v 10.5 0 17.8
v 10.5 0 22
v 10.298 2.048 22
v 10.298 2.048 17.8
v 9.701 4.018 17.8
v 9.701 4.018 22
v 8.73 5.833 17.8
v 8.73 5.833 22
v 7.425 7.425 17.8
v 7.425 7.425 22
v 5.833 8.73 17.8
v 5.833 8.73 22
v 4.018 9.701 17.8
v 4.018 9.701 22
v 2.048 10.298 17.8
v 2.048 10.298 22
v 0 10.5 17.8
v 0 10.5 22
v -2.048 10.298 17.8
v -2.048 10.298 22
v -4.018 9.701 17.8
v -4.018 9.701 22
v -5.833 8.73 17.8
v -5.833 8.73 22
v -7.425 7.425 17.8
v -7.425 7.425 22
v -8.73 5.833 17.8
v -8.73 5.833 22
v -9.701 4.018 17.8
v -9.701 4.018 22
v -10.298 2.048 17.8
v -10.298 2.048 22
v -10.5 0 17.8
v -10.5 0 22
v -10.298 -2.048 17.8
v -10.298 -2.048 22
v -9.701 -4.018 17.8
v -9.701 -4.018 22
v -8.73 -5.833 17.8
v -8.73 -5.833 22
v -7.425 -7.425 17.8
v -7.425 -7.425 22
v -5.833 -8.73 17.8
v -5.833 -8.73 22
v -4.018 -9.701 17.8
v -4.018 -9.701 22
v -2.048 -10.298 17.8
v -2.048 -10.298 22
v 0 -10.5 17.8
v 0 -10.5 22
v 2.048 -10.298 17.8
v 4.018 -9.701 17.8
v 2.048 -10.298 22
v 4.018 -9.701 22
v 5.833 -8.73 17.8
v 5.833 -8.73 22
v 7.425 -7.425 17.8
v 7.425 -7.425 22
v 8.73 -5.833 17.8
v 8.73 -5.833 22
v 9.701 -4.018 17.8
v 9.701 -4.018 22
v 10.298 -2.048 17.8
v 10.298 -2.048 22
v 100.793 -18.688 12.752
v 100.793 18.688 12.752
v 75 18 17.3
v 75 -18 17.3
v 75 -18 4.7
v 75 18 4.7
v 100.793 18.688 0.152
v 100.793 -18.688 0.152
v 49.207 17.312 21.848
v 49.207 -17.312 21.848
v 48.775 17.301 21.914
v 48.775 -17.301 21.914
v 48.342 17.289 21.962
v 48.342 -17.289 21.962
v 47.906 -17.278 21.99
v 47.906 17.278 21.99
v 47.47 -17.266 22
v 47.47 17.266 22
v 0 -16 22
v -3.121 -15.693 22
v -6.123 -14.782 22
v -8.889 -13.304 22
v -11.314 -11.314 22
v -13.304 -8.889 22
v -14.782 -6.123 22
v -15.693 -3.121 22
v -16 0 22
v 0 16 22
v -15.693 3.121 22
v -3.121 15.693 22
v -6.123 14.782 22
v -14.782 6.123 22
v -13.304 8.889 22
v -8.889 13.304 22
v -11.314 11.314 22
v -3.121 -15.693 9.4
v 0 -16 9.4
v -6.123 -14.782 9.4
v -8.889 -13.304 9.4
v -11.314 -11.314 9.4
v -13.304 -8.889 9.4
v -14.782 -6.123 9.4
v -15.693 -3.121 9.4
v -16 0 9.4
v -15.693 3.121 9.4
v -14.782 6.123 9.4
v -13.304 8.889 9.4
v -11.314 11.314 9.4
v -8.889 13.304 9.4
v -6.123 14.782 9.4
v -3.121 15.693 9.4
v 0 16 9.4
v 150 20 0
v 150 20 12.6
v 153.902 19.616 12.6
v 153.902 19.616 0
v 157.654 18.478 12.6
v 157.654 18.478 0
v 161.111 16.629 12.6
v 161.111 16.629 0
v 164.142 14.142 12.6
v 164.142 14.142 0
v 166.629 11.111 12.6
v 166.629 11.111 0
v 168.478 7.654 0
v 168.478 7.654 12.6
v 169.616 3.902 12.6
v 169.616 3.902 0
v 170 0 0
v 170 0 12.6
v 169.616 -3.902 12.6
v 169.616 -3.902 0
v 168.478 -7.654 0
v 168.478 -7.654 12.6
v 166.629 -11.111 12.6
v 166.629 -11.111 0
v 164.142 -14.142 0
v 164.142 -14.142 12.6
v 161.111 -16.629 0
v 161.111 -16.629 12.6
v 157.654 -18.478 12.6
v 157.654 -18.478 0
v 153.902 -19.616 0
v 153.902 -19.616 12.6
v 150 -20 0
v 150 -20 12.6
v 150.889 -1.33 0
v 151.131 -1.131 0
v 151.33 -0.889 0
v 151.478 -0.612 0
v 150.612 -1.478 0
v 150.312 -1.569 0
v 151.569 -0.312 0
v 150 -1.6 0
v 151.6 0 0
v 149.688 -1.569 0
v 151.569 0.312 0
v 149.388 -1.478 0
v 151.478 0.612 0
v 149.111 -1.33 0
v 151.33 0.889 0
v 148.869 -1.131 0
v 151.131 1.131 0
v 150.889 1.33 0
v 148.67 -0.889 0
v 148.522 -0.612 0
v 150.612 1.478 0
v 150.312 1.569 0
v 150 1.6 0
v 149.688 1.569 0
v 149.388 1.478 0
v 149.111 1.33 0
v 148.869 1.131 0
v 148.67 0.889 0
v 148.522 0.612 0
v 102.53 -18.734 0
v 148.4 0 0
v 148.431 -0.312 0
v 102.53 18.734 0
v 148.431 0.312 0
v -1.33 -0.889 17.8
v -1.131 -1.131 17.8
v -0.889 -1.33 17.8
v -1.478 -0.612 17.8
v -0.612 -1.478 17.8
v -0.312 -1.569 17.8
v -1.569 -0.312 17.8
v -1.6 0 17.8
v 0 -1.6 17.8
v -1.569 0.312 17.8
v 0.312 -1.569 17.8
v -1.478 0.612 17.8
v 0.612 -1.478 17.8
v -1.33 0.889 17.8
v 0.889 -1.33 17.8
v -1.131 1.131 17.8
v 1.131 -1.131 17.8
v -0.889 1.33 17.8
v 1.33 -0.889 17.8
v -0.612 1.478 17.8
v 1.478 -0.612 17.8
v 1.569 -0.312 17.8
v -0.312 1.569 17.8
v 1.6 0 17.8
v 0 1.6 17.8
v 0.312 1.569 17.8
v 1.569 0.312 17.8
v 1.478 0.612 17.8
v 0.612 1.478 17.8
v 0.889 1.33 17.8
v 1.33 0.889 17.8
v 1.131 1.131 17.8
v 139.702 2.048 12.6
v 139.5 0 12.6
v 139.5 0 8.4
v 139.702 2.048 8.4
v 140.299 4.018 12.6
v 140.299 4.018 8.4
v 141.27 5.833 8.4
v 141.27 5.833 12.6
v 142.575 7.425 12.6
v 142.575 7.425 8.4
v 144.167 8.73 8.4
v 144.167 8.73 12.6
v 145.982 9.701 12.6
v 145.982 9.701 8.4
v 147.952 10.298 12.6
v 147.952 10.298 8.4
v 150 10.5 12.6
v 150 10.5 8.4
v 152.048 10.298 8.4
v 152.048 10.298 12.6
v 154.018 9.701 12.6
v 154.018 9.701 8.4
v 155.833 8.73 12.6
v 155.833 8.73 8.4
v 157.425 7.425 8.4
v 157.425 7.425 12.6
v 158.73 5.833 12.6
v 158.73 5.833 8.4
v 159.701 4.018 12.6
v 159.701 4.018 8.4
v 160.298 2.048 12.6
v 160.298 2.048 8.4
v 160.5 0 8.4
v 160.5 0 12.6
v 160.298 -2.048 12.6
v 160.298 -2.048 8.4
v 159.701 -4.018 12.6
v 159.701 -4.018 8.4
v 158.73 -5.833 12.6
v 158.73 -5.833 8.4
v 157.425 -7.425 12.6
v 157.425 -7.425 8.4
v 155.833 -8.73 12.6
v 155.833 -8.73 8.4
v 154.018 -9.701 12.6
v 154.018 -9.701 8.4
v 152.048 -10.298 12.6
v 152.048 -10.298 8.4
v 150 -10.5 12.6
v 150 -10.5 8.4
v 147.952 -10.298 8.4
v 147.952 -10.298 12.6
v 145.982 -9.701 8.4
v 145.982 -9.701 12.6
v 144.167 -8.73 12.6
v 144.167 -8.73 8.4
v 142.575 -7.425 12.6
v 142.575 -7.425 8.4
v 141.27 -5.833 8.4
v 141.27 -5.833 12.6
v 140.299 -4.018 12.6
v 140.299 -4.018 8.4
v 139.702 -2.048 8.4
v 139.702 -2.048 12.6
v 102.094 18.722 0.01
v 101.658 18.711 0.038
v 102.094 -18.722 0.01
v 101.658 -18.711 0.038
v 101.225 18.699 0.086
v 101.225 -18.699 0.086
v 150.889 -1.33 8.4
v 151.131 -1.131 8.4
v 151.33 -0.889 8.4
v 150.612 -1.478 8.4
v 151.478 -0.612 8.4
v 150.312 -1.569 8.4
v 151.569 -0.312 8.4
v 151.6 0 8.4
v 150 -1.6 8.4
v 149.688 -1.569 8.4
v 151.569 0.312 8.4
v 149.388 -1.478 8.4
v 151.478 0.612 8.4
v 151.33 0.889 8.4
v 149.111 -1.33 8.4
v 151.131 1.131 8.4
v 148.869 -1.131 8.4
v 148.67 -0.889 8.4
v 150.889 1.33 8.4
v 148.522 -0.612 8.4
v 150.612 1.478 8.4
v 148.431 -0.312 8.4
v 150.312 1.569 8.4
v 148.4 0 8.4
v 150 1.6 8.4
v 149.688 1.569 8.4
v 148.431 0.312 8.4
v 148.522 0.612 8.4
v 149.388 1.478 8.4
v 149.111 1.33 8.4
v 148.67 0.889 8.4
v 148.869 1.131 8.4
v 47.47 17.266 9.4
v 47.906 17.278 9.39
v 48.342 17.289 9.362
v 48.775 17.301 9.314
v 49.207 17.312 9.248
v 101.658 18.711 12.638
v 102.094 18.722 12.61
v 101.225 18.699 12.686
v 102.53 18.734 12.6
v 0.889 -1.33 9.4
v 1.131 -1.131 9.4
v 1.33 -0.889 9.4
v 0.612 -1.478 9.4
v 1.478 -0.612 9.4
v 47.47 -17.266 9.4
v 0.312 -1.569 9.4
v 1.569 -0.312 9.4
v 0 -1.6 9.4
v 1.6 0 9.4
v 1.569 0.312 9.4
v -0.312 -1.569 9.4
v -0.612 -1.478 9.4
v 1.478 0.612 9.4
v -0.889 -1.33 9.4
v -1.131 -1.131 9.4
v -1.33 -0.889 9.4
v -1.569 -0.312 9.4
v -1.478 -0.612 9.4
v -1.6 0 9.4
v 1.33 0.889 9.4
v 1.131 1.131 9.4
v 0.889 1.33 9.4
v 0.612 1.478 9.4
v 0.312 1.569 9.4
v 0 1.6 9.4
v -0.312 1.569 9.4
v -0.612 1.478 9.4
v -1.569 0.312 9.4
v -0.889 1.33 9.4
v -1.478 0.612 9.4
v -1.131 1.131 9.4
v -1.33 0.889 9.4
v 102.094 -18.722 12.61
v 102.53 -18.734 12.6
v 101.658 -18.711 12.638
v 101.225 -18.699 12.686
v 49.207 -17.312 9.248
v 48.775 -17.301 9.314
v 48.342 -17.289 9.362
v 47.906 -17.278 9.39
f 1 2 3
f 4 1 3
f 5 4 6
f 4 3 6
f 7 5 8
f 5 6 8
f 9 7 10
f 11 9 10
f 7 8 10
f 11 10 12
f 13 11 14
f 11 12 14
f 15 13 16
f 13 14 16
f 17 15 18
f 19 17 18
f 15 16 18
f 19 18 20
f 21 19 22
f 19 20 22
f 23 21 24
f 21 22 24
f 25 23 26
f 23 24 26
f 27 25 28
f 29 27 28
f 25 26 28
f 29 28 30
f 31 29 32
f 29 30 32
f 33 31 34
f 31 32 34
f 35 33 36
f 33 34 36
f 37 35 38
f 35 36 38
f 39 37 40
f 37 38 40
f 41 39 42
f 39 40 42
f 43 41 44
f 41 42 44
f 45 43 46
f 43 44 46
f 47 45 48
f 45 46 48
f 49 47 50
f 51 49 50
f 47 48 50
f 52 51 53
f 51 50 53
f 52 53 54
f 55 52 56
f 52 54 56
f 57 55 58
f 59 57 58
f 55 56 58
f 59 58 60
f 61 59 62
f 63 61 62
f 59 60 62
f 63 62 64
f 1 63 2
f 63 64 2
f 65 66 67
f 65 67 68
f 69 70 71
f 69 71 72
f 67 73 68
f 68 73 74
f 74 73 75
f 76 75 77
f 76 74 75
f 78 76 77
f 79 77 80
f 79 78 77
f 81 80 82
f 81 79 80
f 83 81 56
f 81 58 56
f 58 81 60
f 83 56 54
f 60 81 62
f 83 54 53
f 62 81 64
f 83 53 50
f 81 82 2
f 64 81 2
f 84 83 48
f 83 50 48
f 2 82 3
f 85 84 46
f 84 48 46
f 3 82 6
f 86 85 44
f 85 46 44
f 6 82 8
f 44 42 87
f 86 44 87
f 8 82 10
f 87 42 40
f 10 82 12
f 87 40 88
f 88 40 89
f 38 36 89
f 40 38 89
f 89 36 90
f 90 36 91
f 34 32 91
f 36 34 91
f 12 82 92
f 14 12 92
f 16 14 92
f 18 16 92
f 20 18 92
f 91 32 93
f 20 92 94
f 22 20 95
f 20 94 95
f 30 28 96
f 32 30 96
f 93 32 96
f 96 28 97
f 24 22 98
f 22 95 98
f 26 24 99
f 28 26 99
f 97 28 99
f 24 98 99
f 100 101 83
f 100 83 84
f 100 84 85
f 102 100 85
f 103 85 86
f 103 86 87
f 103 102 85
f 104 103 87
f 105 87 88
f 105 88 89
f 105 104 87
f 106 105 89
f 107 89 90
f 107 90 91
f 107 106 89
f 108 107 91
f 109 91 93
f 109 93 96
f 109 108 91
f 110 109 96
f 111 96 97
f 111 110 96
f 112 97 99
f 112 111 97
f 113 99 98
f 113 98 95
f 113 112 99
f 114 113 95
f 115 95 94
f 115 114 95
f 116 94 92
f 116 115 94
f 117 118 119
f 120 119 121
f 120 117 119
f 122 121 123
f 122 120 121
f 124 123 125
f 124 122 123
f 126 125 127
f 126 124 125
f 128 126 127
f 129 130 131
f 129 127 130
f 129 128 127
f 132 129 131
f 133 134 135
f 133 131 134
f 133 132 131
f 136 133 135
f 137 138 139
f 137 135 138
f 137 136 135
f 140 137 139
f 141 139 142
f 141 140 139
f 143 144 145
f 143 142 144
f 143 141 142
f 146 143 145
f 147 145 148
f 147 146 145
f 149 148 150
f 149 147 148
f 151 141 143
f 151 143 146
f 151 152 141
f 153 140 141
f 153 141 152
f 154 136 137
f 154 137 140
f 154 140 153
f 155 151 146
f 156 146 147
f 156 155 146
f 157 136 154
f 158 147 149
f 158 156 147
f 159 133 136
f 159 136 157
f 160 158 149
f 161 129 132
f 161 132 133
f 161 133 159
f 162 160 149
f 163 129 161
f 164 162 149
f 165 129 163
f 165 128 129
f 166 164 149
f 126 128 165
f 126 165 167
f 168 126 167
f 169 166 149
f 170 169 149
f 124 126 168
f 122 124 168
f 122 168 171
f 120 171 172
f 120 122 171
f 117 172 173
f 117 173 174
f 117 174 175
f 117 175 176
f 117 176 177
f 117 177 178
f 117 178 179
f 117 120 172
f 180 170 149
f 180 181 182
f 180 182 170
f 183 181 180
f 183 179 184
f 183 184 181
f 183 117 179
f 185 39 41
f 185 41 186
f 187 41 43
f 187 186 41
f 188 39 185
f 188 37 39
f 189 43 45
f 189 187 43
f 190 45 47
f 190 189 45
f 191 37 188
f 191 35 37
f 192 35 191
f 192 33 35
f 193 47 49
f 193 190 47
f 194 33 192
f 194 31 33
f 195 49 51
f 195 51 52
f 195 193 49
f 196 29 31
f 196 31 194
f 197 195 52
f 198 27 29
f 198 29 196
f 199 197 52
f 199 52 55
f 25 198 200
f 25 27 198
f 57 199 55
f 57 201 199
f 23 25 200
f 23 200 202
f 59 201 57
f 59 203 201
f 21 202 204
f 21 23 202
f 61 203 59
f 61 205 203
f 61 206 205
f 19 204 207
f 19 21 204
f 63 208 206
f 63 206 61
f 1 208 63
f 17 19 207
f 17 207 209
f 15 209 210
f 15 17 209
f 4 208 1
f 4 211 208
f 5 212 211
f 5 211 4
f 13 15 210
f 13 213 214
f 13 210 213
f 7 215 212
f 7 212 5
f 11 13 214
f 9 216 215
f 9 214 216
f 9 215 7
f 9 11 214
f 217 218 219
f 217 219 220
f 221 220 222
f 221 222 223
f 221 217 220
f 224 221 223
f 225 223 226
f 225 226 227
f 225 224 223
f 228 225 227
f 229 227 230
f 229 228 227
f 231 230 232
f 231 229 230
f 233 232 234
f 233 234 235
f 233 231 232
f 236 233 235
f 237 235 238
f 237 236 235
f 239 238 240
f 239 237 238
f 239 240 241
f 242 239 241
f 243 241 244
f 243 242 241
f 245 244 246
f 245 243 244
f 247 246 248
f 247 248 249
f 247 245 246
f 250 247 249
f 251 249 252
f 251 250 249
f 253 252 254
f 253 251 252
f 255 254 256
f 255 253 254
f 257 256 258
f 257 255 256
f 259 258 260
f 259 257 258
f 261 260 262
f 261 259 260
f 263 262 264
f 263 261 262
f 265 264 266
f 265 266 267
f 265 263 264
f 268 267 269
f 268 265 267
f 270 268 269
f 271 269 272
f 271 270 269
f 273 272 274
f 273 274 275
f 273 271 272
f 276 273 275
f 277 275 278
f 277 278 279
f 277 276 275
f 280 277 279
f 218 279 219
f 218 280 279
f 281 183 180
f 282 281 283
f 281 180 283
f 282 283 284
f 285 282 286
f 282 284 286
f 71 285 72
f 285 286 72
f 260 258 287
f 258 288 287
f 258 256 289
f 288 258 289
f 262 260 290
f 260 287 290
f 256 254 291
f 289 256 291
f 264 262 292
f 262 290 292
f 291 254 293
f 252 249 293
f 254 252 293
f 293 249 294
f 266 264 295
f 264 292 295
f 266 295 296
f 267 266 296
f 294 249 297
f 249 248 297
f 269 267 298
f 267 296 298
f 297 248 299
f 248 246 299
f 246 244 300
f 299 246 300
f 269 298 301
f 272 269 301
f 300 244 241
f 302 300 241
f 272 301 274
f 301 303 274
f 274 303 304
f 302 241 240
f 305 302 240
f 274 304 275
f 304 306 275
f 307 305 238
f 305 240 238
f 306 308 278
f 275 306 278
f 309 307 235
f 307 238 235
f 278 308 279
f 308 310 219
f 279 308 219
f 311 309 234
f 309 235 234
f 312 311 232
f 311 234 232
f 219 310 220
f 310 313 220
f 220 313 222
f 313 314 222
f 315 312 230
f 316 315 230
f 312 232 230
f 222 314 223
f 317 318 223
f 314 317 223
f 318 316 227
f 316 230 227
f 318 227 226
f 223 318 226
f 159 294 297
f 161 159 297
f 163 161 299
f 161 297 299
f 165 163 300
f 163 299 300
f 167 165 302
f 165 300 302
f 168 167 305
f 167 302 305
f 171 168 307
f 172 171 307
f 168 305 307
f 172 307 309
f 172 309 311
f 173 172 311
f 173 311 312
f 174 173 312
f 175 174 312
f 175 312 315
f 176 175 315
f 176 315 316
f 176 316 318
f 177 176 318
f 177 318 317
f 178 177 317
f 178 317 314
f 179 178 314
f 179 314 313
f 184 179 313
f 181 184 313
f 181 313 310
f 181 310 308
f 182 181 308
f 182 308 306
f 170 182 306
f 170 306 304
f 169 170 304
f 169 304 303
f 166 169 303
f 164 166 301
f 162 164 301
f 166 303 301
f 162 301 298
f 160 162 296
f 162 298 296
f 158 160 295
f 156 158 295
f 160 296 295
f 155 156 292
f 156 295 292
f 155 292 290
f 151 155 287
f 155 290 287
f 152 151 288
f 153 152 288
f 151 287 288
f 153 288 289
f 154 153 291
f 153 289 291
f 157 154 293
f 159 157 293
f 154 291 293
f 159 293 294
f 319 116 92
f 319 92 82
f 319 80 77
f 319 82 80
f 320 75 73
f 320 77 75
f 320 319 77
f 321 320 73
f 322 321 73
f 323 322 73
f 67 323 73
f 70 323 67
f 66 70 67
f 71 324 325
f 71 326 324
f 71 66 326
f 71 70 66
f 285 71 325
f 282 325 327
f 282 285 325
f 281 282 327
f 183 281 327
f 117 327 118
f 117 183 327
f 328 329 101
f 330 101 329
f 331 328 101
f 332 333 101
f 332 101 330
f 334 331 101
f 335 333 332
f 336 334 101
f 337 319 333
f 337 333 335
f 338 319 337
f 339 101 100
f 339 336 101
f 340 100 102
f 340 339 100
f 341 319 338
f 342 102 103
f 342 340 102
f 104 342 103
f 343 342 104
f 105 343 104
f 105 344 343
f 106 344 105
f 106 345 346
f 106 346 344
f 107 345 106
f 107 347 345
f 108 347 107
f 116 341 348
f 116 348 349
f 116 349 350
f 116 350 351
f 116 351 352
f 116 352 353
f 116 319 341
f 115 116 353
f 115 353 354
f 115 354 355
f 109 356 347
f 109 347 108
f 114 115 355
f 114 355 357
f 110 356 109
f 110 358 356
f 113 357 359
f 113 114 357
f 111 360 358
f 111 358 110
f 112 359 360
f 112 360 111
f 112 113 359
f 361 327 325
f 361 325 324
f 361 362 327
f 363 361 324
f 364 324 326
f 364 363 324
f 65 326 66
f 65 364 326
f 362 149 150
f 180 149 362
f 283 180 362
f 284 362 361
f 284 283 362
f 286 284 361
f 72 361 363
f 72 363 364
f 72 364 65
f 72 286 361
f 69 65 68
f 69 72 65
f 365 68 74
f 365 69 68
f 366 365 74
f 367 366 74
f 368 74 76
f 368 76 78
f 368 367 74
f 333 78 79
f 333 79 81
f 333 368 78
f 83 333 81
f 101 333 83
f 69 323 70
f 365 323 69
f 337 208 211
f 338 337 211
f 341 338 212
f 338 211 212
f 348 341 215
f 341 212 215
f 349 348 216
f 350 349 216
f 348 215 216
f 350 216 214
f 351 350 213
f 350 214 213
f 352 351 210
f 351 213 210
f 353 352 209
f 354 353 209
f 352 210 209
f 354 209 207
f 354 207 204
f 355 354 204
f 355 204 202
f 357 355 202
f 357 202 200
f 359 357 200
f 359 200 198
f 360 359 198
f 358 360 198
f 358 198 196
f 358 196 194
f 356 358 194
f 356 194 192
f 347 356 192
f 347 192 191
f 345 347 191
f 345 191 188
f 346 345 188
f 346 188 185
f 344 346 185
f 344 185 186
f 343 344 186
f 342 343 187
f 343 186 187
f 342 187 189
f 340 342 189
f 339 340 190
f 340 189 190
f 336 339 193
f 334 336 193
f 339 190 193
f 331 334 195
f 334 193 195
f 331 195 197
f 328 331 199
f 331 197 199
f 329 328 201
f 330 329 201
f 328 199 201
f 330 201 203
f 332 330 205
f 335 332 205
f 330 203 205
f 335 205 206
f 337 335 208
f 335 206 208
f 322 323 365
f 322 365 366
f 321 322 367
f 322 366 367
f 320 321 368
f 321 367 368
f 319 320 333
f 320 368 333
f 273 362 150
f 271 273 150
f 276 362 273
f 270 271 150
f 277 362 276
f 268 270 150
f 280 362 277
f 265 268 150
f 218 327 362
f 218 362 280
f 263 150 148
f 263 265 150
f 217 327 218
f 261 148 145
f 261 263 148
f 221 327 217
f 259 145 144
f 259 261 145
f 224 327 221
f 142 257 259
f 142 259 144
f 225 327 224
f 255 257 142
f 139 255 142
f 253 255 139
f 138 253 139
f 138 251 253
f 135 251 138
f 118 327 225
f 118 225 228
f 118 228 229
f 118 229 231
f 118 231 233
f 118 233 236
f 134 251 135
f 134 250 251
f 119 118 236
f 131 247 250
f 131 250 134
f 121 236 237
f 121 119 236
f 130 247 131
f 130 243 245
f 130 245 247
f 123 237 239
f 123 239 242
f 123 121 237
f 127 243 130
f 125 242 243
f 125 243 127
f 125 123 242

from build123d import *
from OCP.BRepFilletAPI import BRepFilletAPI_MakeChamfer

# Parameters (mm, degrees)
EXTRUDE_1_DEPTH     = 22
SKETCH_2_R          = 10.5
CUT_EXTRUDE_1_DEPTH = 4.2
CUT_EXTRUDE_START   = -9.4
CUT_EXTRUDE_6_DEPTH = 9.4
CUT_EXTRUDE_7_DEPTH = 9.4
SKETCH_4_R          = 10.5
CUT_EXTRUDE_2_DEPTH = 4.2
SKETCH_8_R          = 1.6
CUT_EXTRUDE_5_DEPTH = 173.095438638
CHAMFER_1_SIZE      = 4.7
CHAMFER_1_SIZE2     = 26.655024552
CHAMFER_2_SIZE2     = 26.655024552
CHAMFER_2_SIZE      = 4.7
CHAMFER_3_SIZE2     = 4.7
CHAMFER_3_SIZE      = 26.655024552
FILLET_4_R          = 10


with BuildPart() as part:
    # 草图1 → 凸台-拉伸1 (new body)
    with BuildSketch(Plane.XY):
        with BuildLine():
            Line((0, 16), (150, 20))
            ThreePointArc((150, 20), (170, 0), (150, -20))
            Line((150, -20), (0, -16))
            ThreePointArc((0, -16), (-16, 0), (0, 16))
        make_face()
    extrude(amount=EXTRUDE_1_DEPTH)

    # 草图2 → 切除-拉伸1 (cut)
    with BuildSketch(Plane.XY.offset(22)):
        Circle(SKETCH_2_R)
    extrude(amount=-CUT_EXTRUDE_1_DEPTH, mode=Mode.SUBTRACT)

    # 草图9 → 切除-拉伸6 (cut)
    with BuildSketch(Plane.XY.offset(22).offset(CUT_EXTRUDE_START)):
        with BuildLine():
            Line((75, 18), (75, -18))
            Line((75, -18), (150, -20))
            ThreePointArc((150, -20), (170, 0), (150, 20))
            Line((150, 20), (75, 18))
        make_face()
    extrude(amount=CUT_EXTRUDE_6_DEPTH, mode=Mode.SUBTRACT)

    # 草图10 → 切除-拉伸7 (cut)
    with BuildSketch(Plane(origin=(0, 0, 0), x_dir=(-1, 0, 0), z_dir=(0, 0, -1))):
        with BuildLine():
            Line((-75, 18), (-75, -18))
            Line((-75, -18), (0, -16))
            ThreePointArc((0, -16), (16, 0), (0, 16))
            Line((0, 16), (-75, 18))
        make_face()
    extrude(amount=-CUT_EXTRUDE_7_DEPTH, mode=Mode.SUBTRACT)

    # 草图4 → 切除-拉伸2 (cut)
    with BuildSketch(Plane(origin=(0, 0, 12.6), x_dir=(-1, 0, 0), z_dir=(0, 0, -1))):
        with Locations((-150, 0)):
            Circle(SKETCH_4_R)
    extrude(amount=CUT_EXTRUDE_2_DEPTH, mode=Mode.SUBTRACT)

    # 草图8 → 切除-拉伸5 (cut, through all)
    with BuildSketch(Plane.XY.offset(17.8)):
        Circle(SKETCH_8_R)
        with Locations((150, 0)):
            Circle(SKETCH_8_R)
    extrude(amount=-CUT_EXTRUDE_5_DEPTH, mode=Mode.SUBTRACT)

    # 倒角1: one chamfer whose edges measure the first distance from different faces: ONE call of the kernel's chamfer builder (chamfer() names one face for all edges)
    chamfer_1_edges_1 = [part.edges().sort_by_distance(p)[0] for p in [
        (75, 0, 12.6),
    ]]
    chamfer_1_side_1 = [part.faces().sort_by_distance(p)[0] for p in [
        (75, 0, 17.3),
    ]]
    chamfer_1_edges_2 = [part.edges().sort_by_distance(p)[0] for p in [
        (75, 0, 9.4),
    ]]
    chamfer_1_side_2 = [part.faces().sort_by_distance(p)[0] for p in [
        (75, 0, 4.7),
    ]]
    chamfer_1 = BRepFilletAPI_MakeChamfer(part.part.solid().wrapped)
    for e in chamfer_1_edges_1:
        chamfer_1.Add(CHAMFER_1_SIZE, CHAMFER_1_SIZE2, e.wrapped, chamfer_1_side_1[0].wrapped)  # the first distance lies on this face
    for e in chamfer_1_edges_2:
        chamfer_1.Add(CHAMFER_1_SIZE, CHAMFER_1_SIZE2, e.wrapped, chamfer_1_side_2[0].wrapped)  # the first distance lies on this face
    add(Compound.cast(chamfer_1.Shape()), mode=Mode.REPLACE)

    # 倒角2
    chamfer_2_edges = [part.edges().sort_by_distance(p)[0] for p in [
        (75, 0, 22),
    ]]
    chamfer_2_side = [part.faces().sort_by_distance(p)[0] for p in [
        (75, 0, 21.906),
    ]]
    chamfer(chamfer_2_edges, length=CHAMFER_2_SIZE - 0.0001, length2=CHAMFER_2_SIZE2 - 0.0001, reference=chamfer_2_side[0])  # a hair under: the kernel refuses the full size

    # 倒角3
    chamfer_3_edges = [part.edges().sort_by_distance(p)[0] for p in [
        (75, 0, 0),
    ]]
    chamfer_3_side = [part.faces().sort_by_distance(p)[0] for p in [
        (75.094, 0, 0),
    ]]
    chamfer(chamfer_3_edges, length=CHAMFER_3_SIZE - 0.0001, length2=CHAMFER_3_SIZE2 - 0.0001, reference=chamfer_3_side[0])  # a hair under: the kernel refuses the full size

    # 圆角4
    fillet_4_edges = [part.edges().sort_by_distance(p)[0] for p in [
        (101.655024552, 0, 12.6),
        (48.344975448, 0, 9.4),
        (48.345075448, 0, 22),
        (101.654924552, 0, 0),
    ]]
    fillet(fillet_4_edges, radius=FILLET_4_R)


solid = part.part
